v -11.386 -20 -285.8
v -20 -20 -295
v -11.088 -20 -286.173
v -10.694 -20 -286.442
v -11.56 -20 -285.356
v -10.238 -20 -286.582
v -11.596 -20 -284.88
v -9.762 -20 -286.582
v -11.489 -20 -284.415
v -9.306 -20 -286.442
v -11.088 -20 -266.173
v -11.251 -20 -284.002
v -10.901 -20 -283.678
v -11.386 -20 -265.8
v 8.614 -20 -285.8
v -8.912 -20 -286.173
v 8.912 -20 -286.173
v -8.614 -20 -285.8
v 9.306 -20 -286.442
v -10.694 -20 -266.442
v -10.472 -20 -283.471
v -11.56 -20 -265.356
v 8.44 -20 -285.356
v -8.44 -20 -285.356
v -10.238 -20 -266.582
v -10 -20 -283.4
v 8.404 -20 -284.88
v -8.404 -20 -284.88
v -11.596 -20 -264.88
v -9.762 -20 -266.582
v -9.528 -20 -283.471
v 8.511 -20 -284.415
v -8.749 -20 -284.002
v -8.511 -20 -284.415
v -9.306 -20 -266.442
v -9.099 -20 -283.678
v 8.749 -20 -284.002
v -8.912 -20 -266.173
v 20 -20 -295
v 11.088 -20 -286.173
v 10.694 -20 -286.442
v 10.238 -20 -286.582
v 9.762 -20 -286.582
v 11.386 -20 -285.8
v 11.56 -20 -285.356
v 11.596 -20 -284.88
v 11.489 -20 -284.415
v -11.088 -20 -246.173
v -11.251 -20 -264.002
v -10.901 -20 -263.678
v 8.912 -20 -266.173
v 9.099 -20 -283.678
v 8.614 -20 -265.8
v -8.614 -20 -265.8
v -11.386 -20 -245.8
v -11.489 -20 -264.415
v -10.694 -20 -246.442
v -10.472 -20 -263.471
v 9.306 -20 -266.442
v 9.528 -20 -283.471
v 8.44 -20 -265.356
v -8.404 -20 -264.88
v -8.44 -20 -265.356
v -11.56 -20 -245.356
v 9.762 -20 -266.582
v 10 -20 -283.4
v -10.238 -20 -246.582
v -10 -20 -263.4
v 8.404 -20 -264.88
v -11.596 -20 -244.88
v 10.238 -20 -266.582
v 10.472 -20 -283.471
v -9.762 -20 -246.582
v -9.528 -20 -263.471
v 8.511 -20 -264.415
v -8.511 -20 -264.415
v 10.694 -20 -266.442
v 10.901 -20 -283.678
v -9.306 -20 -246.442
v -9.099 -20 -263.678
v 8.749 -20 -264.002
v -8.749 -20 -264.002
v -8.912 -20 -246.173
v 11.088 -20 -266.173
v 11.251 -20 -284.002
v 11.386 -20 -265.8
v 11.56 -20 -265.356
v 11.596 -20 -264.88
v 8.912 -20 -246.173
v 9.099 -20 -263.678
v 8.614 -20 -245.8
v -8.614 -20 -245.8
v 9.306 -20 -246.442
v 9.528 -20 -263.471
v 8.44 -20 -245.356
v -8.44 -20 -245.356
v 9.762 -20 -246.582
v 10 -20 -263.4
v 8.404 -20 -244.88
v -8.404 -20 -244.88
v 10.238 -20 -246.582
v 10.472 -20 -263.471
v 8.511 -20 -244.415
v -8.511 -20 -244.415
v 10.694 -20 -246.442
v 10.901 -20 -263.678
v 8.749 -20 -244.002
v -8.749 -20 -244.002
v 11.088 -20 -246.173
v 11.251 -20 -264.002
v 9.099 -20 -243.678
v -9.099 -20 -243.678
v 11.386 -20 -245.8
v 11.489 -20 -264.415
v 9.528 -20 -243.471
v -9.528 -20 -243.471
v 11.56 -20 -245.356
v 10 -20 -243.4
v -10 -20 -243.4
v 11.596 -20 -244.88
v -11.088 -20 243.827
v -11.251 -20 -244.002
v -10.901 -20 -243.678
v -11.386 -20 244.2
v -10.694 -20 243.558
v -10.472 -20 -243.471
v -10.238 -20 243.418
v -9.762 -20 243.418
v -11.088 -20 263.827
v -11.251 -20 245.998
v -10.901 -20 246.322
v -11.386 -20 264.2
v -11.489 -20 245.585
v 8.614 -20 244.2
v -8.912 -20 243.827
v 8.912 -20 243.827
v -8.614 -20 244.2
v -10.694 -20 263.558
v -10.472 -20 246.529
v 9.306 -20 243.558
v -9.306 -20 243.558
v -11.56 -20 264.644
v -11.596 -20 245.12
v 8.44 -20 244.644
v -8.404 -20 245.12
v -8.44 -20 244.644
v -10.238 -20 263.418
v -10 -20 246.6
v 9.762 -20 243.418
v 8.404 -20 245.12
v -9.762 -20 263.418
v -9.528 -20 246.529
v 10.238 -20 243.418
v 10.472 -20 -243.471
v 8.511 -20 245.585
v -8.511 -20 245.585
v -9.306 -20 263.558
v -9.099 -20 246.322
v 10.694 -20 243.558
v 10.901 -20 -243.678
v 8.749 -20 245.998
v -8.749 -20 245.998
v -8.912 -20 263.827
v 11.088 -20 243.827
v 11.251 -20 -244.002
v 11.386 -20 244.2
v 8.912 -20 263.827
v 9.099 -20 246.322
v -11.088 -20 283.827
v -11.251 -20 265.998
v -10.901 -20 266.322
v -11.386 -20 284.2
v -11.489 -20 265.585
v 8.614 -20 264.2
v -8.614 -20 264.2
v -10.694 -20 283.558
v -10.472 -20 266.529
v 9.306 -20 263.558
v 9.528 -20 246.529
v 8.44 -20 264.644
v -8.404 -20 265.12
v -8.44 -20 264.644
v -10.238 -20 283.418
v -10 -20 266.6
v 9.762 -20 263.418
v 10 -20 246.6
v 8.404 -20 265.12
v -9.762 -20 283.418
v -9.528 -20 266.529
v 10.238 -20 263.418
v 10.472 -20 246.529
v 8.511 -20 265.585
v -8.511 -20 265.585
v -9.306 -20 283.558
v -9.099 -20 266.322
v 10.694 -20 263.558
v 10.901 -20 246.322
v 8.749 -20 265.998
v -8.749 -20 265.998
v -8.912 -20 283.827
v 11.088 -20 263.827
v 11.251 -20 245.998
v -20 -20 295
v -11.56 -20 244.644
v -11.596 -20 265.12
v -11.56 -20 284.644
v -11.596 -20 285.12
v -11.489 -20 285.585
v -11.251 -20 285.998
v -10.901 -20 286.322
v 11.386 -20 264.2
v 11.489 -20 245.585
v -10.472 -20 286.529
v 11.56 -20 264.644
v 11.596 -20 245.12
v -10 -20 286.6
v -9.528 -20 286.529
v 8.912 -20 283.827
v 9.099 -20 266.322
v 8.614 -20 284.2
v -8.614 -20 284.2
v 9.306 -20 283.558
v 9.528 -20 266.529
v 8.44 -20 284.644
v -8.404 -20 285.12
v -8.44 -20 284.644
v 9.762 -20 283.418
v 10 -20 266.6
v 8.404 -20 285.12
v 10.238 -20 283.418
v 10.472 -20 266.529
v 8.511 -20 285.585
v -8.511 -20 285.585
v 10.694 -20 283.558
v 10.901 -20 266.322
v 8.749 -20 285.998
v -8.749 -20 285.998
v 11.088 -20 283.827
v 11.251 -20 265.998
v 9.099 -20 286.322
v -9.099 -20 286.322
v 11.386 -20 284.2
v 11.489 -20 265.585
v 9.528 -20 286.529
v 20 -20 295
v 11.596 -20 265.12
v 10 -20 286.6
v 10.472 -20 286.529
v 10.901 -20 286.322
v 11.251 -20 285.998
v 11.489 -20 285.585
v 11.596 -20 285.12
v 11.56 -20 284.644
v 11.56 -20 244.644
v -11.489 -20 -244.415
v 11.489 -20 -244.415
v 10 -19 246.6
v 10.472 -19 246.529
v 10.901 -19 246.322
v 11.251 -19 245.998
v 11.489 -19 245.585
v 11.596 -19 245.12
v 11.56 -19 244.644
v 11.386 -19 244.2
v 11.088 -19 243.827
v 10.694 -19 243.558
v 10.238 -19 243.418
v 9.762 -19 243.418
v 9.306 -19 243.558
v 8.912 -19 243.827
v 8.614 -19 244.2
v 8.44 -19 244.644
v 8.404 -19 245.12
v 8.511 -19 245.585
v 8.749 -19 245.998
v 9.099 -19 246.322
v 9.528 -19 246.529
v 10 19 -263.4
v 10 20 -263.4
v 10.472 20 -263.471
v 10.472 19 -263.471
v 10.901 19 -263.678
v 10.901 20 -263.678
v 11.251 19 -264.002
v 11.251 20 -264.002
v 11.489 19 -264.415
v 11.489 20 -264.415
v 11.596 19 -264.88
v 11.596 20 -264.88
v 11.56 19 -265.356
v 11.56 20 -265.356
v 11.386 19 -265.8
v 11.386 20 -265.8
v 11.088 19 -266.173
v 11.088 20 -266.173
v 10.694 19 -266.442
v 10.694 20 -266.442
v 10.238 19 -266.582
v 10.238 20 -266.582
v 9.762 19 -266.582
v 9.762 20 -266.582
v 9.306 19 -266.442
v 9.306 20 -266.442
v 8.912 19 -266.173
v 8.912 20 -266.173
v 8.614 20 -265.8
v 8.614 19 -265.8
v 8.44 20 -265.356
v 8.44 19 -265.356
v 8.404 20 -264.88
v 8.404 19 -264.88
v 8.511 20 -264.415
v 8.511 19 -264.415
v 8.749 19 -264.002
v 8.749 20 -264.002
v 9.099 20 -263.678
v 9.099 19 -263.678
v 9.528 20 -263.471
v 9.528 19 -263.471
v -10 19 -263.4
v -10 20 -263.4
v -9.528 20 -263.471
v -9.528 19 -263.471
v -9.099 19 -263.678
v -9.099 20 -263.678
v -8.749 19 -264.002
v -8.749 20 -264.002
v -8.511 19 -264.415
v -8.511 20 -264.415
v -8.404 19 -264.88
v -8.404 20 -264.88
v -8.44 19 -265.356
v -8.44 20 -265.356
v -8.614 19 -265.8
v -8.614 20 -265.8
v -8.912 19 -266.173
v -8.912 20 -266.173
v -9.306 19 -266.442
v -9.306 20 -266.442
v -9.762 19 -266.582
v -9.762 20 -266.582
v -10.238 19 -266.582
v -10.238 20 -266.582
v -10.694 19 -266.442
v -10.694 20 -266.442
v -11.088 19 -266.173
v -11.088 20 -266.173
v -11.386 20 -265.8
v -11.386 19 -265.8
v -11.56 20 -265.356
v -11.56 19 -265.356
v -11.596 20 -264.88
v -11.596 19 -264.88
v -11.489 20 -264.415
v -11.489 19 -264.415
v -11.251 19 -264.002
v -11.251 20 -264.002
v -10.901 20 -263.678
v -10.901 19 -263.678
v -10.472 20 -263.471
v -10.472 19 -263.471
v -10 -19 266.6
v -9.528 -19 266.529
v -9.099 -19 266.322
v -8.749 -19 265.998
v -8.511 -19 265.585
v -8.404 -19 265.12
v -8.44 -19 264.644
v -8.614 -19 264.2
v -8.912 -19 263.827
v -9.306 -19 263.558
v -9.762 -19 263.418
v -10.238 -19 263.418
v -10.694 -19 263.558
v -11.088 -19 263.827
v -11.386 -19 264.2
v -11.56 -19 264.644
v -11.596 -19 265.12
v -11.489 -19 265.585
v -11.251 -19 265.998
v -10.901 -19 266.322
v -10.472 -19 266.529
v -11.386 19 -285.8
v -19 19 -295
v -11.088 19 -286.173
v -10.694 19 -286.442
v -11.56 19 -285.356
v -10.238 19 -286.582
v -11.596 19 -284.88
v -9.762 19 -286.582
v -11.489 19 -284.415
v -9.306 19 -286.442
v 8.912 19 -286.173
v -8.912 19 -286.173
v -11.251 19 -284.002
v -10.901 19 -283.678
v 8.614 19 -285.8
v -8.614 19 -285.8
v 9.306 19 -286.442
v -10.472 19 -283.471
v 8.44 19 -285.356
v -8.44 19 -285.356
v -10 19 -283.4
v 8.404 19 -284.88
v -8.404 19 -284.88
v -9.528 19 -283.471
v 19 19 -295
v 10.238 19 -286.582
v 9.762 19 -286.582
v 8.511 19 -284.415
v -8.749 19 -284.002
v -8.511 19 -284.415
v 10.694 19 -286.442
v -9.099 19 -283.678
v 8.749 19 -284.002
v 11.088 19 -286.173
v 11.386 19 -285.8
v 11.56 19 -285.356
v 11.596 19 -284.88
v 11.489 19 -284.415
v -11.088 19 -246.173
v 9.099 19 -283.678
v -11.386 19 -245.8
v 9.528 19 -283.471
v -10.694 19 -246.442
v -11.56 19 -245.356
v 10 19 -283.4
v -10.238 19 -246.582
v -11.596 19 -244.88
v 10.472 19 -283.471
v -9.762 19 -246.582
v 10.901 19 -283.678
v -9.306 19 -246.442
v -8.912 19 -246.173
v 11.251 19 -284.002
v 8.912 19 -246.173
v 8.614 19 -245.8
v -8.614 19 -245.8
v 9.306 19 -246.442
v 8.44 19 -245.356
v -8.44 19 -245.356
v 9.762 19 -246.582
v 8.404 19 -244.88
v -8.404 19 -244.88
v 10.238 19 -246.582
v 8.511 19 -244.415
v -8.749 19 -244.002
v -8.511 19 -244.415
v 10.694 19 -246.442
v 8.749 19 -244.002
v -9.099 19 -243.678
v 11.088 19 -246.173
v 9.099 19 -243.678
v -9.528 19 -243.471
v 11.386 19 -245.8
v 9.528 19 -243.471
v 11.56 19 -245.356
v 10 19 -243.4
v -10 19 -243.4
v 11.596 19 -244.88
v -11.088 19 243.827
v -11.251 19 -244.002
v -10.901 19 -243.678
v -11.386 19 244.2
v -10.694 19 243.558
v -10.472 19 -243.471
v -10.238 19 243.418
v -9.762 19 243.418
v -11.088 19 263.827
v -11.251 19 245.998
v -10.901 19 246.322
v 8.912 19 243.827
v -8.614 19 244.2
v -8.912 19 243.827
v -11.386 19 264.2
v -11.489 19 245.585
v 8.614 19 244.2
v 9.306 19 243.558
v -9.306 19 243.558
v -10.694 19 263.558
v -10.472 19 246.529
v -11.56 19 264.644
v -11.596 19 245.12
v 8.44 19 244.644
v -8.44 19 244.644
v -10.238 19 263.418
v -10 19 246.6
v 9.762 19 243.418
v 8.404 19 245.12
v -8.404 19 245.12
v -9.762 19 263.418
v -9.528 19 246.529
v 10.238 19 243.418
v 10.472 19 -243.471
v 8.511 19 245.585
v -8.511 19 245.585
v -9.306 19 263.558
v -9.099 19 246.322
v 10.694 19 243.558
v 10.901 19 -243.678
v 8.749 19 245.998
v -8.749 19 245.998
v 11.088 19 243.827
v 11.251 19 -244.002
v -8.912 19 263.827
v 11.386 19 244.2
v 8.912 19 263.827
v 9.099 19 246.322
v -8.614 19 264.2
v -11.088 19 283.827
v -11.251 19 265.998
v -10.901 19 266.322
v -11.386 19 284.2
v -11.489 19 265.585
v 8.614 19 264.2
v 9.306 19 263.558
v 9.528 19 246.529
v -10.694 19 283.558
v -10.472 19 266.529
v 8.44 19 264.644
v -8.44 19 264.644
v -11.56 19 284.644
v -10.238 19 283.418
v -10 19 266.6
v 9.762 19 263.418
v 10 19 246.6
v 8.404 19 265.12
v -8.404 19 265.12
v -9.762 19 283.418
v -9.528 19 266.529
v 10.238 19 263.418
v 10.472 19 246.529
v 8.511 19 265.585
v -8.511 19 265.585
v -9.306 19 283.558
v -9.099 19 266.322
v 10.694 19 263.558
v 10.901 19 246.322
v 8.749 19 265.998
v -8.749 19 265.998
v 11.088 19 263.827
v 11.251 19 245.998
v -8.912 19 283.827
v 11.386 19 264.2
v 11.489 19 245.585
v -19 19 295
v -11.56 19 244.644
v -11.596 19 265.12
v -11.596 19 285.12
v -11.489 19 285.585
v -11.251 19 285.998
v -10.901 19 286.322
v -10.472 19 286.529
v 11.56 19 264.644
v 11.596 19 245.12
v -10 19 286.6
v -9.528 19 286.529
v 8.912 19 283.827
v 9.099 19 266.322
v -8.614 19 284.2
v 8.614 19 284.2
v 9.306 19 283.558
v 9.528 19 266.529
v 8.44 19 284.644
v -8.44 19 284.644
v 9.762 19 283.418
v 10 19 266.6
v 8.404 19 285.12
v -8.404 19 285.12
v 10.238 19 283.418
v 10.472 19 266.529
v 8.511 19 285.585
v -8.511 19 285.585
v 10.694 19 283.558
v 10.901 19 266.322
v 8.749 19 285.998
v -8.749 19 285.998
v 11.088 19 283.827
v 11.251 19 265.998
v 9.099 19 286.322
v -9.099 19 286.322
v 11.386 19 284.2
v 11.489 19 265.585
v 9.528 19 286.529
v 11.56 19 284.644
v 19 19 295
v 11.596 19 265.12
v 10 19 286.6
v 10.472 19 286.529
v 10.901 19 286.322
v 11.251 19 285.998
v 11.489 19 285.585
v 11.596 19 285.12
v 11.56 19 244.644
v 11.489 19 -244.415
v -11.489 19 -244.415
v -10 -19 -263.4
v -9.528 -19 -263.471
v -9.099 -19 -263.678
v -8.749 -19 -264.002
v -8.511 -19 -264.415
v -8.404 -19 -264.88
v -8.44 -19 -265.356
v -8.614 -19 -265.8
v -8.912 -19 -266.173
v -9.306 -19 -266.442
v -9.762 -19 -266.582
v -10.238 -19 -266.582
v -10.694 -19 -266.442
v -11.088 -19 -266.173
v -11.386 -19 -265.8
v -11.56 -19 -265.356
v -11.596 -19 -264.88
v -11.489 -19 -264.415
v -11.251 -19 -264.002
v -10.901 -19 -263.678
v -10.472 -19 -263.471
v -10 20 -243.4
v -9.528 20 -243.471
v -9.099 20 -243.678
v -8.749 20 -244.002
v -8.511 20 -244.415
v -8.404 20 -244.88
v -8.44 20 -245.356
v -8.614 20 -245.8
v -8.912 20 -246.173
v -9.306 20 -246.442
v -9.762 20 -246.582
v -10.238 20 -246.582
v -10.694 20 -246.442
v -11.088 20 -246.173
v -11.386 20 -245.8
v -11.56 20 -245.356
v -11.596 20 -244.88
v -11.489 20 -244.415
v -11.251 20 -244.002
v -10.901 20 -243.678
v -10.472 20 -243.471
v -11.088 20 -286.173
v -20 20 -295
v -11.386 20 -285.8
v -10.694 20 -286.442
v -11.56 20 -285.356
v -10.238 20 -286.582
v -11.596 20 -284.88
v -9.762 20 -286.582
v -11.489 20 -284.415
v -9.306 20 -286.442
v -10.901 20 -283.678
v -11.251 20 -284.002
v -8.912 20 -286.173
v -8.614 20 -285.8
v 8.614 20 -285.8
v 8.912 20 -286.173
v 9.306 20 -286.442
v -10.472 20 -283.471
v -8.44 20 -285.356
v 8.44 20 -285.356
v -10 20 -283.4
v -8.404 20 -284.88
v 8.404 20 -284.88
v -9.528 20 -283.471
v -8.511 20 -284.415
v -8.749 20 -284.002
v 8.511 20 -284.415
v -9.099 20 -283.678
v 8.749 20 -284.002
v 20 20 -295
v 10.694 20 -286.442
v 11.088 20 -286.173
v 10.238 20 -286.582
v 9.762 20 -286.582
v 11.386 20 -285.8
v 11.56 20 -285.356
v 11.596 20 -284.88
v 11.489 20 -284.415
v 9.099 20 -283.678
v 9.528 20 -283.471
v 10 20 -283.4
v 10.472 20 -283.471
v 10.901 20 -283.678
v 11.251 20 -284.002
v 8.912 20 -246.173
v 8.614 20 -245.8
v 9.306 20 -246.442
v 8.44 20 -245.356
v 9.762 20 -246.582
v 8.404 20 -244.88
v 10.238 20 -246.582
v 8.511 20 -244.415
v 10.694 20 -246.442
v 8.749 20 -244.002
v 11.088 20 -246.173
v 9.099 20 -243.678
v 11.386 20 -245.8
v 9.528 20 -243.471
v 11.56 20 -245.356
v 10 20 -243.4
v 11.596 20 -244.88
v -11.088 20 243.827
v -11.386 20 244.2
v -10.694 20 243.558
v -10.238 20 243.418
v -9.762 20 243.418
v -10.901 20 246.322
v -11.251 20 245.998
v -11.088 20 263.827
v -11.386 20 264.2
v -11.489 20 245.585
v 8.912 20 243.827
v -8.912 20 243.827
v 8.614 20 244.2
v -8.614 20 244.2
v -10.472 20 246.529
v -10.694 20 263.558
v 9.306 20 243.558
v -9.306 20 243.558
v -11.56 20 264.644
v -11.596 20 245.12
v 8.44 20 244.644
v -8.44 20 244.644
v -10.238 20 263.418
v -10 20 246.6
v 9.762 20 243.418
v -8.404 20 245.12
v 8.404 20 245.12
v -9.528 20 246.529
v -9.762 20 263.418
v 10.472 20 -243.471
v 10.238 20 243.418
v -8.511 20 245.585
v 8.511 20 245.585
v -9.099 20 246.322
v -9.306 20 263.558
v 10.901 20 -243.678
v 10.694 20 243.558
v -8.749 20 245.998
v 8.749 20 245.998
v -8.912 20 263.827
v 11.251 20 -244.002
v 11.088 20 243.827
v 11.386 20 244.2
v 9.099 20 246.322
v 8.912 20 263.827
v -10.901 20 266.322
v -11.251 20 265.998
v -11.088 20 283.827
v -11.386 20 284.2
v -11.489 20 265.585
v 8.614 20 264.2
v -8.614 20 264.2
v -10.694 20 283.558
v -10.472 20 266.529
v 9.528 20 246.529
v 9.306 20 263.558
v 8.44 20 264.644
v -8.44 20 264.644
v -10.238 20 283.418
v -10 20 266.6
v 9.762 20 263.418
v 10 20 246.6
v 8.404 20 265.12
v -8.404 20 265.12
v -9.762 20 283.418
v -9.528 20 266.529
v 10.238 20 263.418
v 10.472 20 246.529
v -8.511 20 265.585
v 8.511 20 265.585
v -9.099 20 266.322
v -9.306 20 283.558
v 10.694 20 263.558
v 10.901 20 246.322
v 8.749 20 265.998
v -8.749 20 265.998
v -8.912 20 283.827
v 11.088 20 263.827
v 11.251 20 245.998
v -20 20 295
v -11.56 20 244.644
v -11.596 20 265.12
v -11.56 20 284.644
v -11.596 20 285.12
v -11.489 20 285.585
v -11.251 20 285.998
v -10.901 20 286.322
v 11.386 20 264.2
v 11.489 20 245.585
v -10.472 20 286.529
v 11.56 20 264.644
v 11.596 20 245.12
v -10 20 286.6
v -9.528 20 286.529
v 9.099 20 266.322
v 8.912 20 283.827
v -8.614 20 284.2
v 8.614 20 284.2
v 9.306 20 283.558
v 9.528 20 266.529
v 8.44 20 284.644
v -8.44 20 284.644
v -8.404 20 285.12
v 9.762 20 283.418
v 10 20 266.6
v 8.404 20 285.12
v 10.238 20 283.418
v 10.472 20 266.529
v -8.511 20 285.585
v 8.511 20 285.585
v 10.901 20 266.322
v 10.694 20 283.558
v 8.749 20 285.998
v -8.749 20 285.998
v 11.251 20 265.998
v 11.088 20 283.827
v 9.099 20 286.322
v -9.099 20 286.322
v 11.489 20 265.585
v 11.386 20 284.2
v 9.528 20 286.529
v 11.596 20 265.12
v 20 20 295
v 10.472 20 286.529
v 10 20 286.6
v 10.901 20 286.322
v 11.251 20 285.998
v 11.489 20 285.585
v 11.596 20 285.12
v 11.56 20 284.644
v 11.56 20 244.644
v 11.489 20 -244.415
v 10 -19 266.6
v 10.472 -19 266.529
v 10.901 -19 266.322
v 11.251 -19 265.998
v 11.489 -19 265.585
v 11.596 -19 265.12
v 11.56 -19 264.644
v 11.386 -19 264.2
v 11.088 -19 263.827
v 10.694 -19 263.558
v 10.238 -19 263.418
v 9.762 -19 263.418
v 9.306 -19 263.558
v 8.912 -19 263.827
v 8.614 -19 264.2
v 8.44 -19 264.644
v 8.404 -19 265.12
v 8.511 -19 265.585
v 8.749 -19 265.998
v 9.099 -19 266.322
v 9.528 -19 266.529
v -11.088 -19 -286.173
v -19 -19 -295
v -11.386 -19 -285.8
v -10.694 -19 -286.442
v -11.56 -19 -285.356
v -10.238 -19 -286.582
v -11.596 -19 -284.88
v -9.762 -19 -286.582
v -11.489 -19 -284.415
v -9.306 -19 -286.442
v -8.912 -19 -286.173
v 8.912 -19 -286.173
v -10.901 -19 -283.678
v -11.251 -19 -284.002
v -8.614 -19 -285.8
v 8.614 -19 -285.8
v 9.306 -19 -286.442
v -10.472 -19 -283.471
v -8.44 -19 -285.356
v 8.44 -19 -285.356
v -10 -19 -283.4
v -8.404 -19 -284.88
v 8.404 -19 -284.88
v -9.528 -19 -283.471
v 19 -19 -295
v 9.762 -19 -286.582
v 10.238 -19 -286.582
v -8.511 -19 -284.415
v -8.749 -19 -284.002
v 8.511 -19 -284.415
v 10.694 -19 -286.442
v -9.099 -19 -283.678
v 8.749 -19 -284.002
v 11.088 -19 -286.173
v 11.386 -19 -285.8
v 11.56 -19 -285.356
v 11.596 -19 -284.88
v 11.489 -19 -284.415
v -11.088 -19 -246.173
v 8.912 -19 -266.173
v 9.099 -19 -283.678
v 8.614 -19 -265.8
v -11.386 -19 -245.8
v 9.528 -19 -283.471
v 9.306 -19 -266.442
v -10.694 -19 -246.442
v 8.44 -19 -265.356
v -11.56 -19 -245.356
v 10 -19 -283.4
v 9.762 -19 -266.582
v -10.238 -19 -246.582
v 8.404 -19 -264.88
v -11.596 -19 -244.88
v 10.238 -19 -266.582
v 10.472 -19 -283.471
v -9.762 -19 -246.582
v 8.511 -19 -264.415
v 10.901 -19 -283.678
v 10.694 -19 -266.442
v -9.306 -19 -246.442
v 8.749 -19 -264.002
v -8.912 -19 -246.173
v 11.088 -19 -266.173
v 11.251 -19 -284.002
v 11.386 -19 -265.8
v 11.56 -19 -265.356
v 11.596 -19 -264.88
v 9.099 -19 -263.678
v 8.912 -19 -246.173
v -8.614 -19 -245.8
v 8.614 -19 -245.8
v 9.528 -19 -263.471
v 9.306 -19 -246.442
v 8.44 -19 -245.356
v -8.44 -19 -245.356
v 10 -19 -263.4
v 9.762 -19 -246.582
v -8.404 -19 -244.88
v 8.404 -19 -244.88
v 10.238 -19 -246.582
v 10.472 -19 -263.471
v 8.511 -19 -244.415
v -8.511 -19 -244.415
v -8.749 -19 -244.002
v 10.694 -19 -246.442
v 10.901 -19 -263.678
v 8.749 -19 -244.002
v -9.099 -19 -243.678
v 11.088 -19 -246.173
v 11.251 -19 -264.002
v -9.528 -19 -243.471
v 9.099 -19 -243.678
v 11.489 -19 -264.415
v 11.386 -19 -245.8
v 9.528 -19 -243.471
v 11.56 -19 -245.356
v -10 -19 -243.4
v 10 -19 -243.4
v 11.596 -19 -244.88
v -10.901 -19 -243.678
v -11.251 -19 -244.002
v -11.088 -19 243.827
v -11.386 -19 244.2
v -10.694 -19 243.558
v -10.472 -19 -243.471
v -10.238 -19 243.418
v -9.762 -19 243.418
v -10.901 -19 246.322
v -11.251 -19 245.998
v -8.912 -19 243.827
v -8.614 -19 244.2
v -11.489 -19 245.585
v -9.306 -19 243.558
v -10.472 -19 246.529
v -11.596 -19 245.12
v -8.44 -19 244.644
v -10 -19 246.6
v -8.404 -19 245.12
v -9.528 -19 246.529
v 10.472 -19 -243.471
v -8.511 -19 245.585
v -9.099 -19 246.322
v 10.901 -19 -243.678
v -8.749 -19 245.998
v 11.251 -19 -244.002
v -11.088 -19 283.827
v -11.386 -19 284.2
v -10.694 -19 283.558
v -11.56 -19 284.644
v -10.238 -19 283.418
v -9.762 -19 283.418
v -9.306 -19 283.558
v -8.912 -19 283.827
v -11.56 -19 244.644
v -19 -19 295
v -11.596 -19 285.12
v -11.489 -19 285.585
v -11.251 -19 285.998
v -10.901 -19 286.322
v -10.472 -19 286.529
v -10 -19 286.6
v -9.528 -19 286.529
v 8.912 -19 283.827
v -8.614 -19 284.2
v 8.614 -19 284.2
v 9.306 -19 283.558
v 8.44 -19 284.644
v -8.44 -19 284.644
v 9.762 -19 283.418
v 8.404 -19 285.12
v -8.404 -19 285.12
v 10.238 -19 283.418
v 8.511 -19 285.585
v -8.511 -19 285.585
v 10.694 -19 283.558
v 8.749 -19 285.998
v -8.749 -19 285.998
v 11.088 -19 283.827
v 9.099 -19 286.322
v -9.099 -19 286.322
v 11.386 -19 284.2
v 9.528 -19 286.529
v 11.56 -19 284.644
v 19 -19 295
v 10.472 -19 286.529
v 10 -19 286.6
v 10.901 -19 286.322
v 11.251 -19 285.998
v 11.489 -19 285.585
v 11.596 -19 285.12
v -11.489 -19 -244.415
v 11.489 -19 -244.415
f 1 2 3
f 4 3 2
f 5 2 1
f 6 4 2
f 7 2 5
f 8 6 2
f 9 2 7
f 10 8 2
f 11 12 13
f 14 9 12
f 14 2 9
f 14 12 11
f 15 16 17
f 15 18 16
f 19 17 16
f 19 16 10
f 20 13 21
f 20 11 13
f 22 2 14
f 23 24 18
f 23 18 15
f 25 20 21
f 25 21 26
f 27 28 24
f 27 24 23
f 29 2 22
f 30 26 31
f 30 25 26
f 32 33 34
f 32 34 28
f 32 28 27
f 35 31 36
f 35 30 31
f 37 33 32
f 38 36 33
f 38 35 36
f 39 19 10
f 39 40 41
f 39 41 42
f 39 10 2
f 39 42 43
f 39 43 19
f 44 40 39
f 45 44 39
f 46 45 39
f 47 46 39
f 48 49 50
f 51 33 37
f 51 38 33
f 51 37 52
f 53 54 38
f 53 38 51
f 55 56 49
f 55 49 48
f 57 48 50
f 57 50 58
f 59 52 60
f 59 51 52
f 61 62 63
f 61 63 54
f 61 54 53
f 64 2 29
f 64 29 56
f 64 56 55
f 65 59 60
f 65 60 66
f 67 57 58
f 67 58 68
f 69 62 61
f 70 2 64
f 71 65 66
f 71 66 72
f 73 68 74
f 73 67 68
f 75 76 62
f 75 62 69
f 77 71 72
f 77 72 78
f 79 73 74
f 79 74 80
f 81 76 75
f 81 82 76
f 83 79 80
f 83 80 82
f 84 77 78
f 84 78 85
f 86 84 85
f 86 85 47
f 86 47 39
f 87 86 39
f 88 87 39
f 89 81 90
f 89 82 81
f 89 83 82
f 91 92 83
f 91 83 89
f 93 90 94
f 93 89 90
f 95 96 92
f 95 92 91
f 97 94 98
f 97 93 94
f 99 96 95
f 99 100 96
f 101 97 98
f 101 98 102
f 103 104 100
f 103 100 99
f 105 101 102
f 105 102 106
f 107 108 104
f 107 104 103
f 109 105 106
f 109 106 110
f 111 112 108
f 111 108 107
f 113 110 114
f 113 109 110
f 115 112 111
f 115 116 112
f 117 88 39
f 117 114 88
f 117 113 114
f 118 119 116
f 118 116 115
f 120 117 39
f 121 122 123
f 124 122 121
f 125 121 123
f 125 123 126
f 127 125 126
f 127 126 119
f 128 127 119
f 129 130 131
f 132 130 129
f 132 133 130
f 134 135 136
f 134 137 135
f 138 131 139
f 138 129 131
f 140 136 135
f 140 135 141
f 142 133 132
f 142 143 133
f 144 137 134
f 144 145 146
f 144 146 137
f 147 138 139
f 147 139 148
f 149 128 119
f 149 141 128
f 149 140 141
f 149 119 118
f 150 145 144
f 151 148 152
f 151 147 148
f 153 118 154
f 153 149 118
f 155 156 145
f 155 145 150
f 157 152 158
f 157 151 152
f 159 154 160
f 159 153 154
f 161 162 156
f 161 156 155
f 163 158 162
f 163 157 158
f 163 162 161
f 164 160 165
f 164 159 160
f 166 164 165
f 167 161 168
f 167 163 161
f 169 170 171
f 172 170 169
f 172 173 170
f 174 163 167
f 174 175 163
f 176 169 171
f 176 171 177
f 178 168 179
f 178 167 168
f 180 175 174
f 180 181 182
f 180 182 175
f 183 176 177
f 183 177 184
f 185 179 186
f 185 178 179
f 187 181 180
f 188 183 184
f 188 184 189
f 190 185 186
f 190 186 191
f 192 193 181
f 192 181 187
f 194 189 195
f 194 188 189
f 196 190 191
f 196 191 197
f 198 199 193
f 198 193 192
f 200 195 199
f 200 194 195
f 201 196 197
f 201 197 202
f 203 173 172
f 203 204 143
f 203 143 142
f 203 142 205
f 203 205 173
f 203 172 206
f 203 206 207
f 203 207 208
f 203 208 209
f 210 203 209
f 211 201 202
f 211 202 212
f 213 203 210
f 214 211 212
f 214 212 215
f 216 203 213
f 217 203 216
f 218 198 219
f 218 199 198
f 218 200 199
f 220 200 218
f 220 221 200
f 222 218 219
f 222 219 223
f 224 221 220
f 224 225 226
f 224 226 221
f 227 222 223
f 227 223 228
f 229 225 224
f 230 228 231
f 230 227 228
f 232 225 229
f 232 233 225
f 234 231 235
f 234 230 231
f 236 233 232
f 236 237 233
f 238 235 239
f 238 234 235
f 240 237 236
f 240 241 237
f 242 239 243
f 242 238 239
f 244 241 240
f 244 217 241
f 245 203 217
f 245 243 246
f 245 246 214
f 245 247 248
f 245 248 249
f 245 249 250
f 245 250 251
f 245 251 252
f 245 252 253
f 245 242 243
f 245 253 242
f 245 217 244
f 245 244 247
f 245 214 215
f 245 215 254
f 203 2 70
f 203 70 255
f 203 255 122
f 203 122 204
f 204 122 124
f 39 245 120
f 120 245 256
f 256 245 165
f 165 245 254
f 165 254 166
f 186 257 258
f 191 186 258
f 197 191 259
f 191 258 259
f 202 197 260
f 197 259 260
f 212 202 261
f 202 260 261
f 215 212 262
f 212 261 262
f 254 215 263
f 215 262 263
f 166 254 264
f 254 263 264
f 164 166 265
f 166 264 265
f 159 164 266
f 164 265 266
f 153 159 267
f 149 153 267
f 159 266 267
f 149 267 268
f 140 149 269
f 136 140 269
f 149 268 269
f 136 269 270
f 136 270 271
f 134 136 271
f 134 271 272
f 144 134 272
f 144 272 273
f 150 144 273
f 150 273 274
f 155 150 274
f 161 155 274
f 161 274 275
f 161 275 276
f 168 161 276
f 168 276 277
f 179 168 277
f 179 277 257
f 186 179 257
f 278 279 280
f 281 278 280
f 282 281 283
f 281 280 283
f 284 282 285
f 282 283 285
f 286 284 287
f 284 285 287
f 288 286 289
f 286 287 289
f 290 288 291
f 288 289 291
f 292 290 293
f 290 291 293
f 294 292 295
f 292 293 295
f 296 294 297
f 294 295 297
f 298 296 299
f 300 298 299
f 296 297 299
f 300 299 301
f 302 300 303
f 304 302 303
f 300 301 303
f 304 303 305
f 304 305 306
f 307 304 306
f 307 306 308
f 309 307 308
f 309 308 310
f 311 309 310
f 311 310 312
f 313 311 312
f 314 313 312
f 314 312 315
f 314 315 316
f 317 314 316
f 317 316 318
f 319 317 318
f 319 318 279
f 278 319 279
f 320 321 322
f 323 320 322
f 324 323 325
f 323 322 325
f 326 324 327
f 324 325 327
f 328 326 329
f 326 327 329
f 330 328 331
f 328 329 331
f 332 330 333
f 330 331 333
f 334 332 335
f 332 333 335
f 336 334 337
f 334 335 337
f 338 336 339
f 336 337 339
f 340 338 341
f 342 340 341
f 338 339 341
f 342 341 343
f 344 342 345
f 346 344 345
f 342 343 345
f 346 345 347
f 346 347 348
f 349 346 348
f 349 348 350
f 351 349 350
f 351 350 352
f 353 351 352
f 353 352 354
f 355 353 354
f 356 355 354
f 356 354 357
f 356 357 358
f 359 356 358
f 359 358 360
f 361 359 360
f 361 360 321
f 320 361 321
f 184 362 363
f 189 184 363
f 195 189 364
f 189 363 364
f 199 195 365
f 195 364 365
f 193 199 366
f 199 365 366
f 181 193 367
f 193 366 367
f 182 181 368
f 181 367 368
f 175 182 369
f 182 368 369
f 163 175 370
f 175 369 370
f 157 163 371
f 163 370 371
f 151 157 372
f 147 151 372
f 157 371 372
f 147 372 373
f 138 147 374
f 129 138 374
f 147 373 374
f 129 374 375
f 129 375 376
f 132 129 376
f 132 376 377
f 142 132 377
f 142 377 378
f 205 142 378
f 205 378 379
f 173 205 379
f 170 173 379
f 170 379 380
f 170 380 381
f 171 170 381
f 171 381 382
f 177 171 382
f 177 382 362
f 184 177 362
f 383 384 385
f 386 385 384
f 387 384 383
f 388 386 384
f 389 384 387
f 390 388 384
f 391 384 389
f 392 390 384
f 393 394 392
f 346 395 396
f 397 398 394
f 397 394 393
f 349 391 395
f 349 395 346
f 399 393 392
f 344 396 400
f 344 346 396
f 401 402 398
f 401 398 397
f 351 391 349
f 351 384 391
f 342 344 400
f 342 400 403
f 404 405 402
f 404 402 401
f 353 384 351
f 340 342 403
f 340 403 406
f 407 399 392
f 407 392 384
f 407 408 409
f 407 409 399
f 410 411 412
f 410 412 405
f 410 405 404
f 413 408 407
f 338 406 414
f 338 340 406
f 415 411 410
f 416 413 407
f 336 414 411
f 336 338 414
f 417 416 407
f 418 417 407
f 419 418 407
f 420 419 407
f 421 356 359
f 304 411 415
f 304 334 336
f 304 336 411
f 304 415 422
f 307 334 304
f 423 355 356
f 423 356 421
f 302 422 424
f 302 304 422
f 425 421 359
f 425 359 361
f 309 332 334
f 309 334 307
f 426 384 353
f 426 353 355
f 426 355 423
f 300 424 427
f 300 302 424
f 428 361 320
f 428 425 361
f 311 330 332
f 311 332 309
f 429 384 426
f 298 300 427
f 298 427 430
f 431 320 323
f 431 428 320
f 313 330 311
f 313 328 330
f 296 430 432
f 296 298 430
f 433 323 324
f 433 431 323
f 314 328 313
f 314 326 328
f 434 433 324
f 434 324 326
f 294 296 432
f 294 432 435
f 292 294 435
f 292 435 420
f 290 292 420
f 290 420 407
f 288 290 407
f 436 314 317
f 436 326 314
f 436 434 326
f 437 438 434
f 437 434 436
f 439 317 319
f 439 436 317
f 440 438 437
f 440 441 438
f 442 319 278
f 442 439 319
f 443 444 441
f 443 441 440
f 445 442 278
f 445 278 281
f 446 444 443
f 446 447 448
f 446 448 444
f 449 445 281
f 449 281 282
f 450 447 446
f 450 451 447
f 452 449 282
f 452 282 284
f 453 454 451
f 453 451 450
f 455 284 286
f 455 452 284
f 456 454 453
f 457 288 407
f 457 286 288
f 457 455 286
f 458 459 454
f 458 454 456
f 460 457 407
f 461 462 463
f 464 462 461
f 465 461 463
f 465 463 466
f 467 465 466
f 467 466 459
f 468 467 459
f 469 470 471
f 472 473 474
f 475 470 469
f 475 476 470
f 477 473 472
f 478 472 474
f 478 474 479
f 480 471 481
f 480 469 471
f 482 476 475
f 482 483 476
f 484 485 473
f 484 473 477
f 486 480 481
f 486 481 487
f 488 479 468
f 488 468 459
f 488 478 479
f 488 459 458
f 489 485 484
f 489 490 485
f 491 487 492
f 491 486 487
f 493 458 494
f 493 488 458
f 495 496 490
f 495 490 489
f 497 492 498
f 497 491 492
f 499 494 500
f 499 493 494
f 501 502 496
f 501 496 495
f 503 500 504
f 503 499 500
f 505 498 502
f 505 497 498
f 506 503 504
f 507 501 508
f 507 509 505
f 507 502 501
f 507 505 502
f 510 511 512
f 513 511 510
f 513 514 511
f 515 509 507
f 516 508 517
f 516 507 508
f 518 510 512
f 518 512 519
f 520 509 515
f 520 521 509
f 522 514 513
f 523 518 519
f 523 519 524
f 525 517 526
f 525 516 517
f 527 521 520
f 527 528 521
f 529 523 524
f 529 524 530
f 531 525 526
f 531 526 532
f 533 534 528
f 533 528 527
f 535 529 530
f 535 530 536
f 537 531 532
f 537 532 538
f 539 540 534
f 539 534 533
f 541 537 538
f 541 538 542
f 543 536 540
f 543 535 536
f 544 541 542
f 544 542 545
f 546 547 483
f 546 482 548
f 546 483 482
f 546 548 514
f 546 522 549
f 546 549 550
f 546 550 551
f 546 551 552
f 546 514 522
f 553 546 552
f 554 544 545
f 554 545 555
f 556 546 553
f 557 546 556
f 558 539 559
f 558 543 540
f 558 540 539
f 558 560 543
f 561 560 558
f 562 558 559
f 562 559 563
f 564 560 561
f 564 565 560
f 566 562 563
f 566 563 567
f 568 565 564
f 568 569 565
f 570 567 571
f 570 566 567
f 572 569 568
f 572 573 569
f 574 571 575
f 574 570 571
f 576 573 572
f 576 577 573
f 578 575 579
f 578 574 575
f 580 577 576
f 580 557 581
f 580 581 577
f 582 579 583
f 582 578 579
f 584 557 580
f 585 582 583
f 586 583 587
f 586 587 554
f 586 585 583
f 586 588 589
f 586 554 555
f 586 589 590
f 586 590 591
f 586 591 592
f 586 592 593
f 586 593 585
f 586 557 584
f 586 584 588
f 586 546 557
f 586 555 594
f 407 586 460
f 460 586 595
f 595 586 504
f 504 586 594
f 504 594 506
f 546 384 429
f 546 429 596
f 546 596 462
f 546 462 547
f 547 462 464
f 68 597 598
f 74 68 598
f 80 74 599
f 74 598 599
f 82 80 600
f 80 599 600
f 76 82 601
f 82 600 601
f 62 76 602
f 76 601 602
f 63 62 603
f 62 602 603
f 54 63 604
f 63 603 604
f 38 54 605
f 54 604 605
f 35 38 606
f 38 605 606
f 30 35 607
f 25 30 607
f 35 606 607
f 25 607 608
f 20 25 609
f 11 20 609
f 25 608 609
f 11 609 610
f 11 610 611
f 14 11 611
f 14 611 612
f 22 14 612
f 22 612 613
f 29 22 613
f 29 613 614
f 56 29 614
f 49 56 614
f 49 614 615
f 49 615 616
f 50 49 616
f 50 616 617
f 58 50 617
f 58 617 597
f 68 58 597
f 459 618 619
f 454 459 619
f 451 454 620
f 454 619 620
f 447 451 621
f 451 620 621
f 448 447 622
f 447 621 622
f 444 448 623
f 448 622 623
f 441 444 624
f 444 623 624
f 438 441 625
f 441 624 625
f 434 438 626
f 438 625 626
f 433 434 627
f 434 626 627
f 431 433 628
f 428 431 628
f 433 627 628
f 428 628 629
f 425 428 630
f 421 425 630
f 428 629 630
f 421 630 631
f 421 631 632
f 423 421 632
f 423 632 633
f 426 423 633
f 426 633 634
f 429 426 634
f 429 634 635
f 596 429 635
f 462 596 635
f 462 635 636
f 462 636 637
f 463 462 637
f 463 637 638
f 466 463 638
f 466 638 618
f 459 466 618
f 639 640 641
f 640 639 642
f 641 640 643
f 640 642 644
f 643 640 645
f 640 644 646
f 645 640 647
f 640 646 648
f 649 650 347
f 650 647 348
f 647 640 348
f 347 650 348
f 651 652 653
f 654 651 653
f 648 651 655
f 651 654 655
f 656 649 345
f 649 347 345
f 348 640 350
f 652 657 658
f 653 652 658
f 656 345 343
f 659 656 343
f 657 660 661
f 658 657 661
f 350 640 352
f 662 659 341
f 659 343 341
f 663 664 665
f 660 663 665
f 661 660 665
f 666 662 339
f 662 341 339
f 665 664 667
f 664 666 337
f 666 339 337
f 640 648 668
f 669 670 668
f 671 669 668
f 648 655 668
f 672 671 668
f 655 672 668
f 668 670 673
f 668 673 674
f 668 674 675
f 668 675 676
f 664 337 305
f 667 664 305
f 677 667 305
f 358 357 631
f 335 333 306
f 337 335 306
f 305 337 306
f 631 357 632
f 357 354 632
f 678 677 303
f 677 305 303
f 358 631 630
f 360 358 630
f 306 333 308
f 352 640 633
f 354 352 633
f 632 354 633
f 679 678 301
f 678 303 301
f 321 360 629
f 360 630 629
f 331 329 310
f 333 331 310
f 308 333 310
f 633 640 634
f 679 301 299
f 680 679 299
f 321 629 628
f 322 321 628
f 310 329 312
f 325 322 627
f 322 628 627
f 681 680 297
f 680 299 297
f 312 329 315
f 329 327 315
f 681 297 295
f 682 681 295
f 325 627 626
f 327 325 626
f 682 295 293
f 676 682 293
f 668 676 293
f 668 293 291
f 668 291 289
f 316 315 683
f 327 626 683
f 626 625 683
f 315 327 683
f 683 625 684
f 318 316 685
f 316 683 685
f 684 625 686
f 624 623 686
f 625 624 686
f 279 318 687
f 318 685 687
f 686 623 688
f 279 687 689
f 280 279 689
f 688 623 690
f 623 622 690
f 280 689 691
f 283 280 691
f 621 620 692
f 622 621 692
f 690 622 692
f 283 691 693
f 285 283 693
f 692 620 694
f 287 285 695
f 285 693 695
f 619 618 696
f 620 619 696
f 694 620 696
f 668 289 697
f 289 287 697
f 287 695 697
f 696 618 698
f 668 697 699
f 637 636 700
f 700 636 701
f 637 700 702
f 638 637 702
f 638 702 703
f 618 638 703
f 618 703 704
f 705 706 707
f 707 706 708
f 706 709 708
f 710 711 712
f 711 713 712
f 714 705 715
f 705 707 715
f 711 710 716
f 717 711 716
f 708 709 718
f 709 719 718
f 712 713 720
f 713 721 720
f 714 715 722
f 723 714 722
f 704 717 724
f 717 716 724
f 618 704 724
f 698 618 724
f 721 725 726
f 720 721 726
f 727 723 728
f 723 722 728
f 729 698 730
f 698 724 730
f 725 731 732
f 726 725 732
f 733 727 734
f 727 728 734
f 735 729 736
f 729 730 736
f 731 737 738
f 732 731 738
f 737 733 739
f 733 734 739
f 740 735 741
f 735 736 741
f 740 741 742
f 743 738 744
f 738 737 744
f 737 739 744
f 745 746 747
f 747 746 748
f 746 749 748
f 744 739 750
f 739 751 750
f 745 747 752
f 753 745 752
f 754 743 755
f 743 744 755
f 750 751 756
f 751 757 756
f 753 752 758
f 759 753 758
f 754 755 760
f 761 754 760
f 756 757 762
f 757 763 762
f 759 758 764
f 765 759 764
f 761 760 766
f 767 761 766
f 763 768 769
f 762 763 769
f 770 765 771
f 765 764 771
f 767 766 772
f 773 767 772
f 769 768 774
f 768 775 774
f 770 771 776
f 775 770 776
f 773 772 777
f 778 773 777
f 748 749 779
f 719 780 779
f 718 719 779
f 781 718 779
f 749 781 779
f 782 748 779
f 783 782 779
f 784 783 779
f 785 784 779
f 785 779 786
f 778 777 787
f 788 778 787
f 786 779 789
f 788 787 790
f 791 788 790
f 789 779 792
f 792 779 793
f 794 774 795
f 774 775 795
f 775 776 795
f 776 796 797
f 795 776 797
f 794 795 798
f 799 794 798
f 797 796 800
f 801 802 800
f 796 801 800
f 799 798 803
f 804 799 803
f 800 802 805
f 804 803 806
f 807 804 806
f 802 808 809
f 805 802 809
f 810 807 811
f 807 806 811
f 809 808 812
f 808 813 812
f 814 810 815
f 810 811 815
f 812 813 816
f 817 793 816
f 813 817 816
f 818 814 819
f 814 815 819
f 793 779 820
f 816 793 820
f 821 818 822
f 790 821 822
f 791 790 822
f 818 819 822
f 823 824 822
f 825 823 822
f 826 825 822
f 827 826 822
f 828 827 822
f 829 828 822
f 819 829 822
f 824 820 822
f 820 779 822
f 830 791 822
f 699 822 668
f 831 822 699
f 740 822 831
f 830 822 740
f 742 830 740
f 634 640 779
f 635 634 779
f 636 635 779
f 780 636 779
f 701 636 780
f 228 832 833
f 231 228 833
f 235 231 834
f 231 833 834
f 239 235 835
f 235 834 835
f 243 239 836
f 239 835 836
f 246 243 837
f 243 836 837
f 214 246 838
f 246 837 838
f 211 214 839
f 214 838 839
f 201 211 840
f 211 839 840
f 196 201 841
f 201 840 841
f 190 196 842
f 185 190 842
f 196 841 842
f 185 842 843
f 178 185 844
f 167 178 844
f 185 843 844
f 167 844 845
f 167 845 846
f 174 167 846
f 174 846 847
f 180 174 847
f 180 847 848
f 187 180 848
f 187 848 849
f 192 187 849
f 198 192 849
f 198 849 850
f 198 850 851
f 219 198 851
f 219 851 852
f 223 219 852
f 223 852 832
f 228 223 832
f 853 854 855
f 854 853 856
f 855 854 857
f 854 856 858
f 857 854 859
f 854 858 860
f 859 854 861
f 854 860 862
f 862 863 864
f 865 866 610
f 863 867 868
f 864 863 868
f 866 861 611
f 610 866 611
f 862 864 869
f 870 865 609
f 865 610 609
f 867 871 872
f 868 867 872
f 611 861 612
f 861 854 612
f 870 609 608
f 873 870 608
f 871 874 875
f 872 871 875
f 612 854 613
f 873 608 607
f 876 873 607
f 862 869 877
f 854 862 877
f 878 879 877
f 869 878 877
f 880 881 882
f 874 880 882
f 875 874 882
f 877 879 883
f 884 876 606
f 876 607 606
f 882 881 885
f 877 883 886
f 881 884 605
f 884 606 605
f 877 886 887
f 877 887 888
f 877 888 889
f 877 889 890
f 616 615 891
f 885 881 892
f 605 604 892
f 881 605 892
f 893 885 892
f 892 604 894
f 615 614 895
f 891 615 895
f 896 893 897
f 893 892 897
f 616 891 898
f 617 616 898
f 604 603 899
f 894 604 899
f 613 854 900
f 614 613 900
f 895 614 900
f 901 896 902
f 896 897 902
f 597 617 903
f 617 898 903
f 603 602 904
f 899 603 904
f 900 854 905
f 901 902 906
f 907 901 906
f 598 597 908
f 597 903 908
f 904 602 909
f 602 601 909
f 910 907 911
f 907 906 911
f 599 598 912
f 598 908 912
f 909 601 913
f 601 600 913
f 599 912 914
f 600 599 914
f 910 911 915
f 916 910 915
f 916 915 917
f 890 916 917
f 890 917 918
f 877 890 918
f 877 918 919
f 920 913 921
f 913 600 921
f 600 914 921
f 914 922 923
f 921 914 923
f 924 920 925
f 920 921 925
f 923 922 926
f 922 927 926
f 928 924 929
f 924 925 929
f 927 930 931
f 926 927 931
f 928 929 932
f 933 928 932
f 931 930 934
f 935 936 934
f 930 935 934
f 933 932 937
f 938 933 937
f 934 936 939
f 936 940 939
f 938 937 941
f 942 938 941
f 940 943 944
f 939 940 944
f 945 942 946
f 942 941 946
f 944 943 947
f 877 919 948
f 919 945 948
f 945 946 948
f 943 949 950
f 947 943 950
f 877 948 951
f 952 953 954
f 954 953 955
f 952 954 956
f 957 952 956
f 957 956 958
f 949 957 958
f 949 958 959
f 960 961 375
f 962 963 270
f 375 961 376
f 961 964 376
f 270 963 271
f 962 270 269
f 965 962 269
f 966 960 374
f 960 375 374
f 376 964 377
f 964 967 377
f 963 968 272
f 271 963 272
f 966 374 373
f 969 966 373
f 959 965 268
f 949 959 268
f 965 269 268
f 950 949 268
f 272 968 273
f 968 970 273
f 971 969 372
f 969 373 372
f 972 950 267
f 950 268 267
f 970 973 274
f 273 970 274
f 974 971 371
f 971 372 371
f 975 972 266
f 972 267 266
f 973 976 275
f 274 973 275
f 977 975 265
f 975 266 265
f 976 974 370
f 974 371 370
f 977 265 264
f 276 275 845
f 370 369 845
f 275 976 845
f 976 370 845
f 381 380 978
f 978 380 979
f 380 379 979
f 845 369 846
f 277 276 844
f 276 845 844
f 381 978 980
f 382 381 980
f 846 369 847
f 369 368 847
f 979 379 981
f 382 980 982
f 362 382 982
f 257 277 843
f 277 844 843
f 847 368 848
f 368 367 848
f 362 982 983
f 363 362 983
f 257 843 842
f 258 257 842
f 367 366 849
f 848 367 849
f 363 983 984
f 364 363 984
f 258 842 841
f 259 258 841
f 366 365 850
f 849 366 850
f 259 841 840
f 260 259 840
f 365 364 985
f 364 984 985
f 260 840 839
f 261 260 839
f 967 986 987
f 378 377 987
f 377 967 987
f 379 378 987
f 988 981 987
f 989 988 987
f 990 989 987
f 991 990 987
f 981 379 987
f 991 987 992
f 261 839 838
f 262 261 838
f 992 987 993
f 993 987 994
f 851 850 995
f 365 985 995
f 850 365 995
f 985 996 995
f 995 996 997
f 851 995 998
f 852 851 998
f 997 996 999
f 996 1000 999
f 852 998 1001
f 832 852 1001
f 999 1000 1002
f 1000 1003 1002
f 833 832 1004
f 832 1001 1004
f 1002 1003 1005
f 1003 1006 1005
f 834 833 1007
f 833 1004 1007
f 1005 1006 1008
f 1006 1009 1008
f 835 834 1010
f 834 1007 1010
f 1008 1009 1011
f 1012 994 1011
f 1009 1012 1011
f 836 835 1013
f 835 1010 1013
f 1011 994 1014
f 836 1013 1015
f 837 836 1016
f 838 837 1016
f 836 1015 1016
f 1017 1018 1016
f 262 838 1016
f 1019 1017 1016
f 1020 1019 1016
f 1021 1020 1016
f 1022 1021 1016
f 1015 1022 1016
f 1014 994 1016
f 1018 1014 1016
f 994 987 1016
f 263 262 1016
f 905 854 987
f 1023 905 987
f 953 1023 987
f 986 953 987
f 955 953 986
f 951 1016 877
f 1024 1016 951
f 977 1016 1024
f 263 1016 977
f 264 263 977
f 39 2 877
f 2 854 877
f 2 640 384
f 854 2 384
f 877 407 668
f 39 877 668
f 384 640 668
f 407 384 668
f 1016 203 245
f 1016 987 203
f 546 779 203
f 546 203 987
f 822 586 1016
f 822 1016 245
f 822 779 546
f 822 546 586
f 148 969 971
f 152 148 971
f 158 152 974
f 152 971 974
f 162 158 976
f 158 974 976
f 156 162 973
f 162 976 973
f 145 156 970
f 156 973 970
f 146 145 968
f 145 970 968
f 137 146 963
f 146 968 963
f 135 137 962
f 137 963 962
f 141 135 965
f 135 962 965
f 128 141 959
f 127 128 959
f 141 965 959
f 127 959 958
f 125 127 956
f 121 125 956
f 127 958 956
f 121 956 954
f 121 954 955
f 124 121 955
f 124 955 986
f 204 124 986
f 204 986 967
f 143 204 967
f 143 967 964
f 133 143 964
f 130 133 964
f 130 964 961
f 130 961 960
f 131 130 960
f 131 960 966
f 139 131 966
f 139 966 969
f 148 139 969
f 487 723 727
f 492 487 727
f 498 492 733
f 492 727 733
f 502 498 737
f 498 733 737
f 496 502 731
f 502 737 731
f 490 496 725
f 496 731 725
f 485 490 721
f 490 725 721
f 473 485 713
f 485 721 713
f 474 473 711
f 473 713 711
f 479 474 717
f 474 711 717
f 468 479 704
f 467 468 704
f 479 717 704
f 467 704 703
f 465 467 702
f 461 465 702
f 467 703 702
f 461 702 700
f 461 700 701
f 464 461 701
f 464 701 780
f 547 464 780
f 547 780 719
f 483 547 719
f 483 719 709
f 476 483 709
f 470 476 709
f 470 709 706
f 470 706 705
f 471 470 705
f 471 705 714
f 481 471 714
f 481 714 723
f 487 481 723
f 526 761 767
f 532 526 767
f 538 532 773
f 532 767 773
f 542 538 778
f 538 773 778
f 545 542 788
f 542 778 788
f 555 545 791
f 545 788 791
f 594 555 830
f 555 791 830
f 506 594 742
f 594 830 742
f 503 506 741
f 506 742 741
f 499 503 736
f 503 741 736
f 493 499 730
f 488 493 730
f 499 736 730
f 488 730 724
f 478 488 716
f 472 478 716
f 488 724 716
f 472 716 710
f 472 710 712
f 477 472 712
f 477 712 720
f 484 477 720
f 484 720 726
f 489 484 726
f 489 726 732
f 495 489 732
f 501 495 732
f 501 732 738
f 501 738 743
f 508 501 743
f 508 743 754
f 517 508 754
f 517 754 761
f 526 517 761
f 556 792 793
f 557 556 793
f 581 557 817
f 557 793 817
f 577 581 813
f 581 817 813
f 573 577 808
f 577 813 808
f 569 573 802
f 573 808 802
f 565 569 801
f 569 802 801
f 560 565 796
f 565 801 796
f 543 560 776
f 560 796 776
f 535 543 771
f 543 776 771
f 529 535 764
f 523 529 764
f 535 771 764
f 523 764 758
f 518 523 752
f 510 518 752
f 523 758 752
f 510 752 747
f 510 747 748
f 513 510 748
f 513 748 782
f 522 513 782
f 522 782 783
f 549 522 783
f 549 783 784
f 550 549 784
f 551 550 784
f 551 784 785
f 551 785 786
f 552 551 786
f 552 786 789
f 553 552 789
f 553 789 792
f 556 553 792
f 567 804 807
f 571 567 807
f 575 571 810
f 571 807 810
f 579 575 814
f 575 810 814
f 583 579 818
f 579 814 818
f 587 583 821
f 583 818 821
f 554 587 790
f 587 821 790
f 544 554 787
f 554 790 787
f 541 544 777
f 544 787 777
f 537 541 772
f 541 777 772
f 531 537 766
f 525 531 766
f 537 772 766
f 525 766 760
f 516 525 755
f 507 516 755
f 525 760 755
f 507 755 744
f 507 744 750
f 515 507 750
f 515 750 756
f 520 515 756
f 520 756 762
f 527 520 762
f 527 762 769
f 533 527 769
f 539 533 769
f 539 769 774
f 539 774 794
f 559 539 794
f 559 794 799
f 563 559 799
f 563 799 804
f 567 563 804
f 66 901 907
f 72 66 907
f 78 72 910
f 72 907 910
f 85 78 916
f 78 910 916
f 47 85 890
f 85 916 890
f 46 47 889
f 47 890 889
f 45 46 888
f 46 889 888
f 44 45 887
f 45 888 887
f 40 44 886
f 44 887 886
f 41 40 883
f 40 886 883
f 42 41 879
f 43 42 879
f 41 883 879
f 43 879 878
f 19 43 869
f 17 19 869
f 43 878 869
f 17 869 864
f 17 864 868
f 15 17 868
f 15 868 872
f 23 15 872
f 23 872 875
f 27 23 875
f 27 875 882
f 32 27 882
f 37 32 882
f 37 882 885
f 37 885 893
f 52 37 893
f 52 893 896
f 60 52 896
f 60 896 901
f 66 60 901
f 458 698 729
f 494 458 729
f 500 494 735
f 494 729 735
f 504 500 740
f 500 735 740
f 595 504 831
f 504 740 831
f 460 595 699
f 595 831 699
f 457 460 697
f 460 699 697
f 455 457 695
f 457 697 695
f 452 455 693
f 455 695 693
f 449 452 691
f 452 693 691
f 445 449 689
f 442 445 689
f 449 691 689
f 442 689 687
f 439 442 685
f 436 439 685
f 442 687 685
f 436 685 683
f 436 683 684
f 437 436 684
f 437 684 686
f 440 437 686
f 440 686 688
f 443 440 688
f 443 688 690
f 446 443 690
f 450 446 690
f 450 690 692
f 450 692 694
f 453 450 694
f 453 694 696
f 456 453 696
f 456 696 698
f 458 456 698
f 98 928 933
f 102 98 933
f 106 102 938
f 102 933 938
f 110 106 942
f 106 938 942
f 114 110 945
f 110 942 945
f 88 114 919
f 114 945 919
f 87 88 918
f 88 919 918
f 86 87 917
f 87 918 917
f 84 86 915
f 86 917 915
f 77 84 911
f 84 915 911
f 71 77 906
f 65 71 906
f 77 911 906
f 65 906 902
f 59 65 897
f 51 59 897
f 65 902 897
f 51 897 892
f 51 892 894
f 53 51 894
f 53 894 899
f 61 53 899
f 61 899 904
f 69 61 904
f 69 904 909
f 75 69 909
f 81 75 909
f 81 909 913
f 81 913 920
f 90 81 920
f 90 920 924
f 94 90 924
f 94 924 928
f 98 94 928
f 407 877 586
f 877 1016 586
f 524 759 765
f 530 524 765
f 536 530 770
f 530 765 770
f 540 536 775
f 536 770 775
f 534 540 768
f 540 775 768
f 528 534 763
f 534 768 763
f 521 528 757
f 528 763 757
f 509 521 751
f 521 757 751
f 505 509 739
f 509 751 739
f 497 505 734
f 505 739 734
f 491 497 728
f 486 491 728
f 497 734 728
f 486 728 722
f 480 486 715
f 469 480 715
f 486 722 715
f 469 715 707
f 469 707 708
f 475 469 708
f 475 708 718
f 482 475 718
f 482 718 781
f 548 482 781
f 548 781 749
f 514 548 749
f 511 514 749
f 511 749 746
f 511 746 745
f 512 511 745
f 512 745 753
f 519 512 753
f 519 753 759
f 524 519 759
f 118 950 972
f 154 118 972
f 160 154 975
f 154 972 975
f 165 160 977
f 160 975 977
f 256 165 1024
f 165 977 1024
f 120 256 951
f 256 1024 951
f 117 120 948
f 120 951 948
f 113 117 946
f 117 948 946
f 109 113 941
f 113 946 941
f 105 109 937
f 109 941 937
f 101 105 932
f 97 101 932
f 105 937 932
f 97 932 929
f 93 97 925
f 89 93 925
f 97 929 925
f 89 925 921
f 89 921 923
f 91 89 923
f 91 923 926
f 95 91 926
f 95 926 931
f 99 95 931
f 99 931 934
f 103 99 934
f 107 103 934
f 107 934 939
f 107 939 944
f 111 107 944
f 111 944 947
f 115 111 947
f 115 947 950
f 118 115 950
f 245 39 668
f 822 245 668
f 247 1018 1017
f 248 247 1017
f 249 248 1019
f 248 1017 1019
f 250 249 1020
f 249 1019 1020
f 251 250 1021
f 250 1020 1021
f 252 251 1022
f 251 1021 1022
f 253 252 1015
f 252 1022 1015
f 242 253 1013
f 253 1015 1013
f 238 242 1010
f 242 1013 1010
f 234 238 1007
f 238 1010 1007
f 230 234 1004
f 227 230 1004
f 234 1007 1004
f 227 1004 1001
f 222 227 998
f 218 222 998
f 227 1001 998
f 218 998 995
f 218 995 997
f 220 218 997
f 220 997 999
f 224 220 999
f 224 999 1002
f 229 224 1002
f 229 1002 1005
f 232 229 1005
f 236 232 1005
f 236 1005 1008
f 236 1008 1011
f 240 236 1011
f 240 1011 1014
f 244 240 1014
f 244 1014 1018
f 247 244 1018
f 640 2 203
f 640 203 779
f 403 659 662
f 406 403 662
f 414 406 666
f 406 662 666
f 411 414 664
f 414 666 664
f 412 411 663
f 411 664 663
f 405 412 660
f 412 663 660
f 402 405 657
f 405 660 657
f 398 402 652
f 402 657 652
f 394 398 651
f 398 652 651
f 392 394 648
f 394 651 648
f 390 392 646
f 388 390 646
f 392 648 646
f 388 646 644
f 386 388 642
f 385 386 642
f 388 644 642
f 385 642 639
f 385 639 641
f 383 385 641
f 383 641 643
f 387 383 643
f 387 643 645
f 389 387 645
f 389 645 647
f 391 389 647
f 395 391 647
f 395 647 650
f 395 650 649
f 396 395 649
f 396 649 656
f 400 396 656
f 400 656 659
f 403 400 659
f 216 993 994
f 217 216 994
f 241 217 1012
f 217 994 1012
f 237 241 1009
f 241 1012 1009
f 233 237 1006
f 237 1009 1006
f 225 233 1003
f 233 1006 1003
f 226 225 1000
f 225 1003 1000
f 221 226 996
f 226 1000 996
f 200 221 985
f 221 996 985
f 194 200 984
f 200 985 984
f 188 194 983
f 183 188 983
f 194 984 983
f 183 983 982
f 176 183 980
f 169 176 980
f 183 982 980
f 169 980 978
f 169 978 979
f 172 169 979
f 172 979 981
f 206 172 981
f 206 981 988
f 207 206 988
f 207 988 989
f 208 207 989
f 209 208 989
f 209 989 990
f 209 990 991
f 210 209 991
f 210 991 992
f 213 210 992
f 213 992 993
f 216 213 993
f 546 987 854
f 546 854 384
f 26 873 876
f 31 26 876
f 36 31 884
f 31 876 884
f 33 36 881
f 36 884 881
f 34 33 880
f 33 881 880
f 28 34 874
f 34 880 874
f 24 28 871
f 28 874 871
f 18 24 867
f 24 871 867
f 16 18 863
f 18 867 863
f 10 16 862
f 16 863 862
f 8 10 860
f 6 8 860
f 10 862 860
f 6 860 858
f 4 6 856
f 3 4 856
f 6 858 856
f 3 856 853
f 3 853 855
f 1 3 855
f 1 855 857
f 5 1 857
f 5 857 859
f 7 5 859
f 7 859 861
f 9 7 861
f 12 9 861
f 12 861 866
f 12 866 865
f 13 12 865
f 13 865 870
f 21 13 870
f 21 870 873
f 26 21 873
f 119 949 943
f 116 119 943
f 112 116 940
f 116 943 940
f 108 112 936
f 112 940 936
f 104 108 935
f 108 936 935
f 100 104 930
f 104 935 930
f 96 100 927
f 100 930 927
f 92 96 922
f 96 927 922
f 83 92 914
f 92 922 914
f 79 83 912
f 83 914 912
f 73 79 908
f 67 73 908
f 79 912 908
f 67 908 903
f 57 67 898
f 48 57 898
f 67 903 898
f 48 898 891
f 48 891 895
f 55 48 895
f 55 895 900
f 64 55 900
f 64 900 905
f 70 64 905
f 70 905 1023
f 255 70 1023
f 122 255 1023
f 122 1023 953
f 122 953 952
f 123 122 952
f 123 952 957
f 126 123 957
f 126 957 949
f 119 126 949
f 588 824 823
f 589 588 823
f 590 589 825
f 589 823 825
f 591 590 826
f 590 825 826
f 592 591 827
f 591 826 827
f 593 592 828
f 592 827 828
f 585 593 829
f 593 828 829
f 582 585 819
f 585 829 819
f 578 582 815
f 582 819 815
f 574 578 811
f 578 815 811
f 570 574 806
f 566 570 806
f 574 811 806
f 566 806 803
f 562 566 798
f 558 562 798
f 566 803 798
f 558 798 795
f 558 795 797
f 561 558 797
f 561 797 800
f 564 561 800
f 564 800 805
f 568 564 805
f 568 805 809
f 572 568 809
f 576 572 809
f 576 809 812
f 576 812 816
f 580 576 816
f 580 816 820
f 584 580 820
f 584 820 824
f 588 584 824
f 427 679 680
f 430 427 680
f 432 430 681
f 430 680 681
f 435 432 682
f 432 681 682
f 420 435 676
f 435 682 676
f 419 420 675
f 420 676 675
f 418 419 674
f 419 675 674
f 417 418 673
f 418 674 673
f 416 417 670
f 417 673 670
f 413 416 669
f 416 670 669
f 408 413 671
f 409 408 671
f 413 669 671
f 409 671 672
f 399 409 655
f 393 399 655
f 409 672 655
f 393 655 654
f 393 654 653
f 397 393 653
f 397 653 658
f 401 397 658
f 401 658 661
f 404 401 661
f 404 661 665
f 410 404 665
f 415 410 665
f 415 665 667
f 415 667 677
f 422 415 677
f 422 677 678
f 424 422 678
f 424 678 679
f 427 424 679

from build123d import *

# Parameters (mm, degrees)
SKETCH_1_W          = 40
SKETCH_1_H          = 40
SKETCH_1_W_2        = 38
SKETCH_1_H_2        = 38
EXTRUDE_1_DEPTH     = 295
SKETCH_3_R          = 1.6
CUT_EXTRUDE_2_DEPTH = 60


with BuildPart() as part:
    # 草图1 → 凸台-拉伸1 (new, symmetric)
    with BuildSketch(Plane.XY):
        Rectangle(SKETCH_1_W, SKETCH_1_H)
        Rectangle(SKETCH_1_W_2, SKETCH_1_H_2, mode=Mode.SUBTRACT)
    extrude(amount=EXTRUDE_1_DEPTH, both=True)

    # 草图3 → 切除-拉伸2 (cut)
    with BuildSketch(Plane(origin=(0, 20, 0), x_dir=(1, 0, 0), z_dir=(0, 1, 0))):
        with Locations(Location((-10, 245, 0), (0, 0, 270))):
            Circle(SKETCH_3_R)
        with Locations(Location((10, 245, 0), (0, 0, 270))):
            Circle(SKETCH_3_R)
        with Locations(Location((10, 265, 0), (0, 0, 270))):
            Circle(SKETCH_3_R)
        with Locations(Location((-10, 265, 0), (0, 0, 270))):
            Circle(SKETCH_3_R)
        with Locations(Location((-10, 285, 0), (0, 0, 270))):
            Circle(SKETCH_3_R)
        with Locations(Location((10, 285, 0), (0, 0, 270))):
            Circle(SKETCH_3_R)
        with Locations(Location((10, -285, 0), (0, 0, 270))):
            Circle(SKETCH_3_R)
        with Locations(Location((-10, -285, 0), (0, 0, 270))):
            Circle(SKETCH_3_R)
        with Locations(Location((-10, -265, 0), (0, 0, 270))):
            Circle(SKETCH_3_R)
        with Locations(Location((10, -265, 0), (0, 0, 270))):
            Circle(SKETCH_3_R)
        with Locations(Location((10, -245, 0), (0, 0, 270))):
            Circle(SKETCH_3_R)
        with Locations(Location((-10, -245, 0), (0, 0, 270))):
            Circle(SKETCH_3_R)
    extrude(amount=-CUT_EXTRUDE_2_DEPTH, mode=Mode.SUBTRACT)


solid = part.part
